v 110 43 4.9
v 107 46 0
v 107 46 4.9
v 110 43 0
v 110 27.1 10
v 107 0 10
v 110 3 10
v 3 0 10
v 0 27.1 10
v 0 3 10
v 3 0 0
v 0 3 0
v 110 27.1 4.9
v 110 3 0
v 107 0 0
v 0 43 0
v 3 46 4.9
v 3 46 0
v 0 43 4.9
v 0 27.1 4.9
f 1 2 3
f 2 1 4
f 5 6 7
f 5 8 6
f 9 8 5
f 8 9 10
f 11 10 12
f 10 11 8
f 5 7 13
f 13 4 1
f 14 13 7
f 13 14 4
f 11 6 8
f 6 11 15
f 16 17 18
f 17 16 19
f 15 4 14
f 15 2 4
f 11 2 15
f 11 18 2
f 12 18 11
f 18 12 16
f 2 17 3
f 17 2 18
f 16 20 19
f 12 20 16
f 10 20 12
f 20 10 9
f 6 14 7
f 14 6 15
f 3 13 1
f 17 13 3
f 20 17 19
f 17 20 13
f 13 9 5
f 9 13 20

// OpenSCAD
$fn = 32;

// ----------------------------------------------------------------------
// Stepped bar: sidestep, 110 x 46 x 10/4.9 mm
// ----------------------------------------------------------------------

// --- parameters (mm) ---
bar_l = 110;              // bar length, X
bar_w = 46;               // bar width, Y
plate_t = 10;             // thickness of the thick zone, Z
thin_t = 4.9;             // thickness of the thin zone
corner_c = 3;             // corner chamfer of the bar
step_cut = 5.1;           // material removed from the thin zone
ledge_y = 27.1;           // start of the ledge from the front edge
depth_1 = 5.1;            // depth of cut 1 from the top face
fit_tol = 0.1;            // declared fit tolerance (prompt contract)
free_tol = 0.3;           // declared free tolerance (prompt contract)

profile = [[3, 0], [107, 0], [110, 3], [110, 43], [107, 46], [3, 46], [0, 43], [0, 3]];  // primary outline, 8 points, counter clockwise
void_1 = [[-1, 27.1], [111, 27.1], [111, 47], [-1, 47]];  // ledge cut along one edge, 4 points

// --- the one profile operation ---
difference() {
  linear_extrude(height = plate_t) polygon(points = profile);
  translate([0, 0, plate_t - depth_1])
    linear_extrude(height = depth_1 + 1) polygon(points = void_1);
}
